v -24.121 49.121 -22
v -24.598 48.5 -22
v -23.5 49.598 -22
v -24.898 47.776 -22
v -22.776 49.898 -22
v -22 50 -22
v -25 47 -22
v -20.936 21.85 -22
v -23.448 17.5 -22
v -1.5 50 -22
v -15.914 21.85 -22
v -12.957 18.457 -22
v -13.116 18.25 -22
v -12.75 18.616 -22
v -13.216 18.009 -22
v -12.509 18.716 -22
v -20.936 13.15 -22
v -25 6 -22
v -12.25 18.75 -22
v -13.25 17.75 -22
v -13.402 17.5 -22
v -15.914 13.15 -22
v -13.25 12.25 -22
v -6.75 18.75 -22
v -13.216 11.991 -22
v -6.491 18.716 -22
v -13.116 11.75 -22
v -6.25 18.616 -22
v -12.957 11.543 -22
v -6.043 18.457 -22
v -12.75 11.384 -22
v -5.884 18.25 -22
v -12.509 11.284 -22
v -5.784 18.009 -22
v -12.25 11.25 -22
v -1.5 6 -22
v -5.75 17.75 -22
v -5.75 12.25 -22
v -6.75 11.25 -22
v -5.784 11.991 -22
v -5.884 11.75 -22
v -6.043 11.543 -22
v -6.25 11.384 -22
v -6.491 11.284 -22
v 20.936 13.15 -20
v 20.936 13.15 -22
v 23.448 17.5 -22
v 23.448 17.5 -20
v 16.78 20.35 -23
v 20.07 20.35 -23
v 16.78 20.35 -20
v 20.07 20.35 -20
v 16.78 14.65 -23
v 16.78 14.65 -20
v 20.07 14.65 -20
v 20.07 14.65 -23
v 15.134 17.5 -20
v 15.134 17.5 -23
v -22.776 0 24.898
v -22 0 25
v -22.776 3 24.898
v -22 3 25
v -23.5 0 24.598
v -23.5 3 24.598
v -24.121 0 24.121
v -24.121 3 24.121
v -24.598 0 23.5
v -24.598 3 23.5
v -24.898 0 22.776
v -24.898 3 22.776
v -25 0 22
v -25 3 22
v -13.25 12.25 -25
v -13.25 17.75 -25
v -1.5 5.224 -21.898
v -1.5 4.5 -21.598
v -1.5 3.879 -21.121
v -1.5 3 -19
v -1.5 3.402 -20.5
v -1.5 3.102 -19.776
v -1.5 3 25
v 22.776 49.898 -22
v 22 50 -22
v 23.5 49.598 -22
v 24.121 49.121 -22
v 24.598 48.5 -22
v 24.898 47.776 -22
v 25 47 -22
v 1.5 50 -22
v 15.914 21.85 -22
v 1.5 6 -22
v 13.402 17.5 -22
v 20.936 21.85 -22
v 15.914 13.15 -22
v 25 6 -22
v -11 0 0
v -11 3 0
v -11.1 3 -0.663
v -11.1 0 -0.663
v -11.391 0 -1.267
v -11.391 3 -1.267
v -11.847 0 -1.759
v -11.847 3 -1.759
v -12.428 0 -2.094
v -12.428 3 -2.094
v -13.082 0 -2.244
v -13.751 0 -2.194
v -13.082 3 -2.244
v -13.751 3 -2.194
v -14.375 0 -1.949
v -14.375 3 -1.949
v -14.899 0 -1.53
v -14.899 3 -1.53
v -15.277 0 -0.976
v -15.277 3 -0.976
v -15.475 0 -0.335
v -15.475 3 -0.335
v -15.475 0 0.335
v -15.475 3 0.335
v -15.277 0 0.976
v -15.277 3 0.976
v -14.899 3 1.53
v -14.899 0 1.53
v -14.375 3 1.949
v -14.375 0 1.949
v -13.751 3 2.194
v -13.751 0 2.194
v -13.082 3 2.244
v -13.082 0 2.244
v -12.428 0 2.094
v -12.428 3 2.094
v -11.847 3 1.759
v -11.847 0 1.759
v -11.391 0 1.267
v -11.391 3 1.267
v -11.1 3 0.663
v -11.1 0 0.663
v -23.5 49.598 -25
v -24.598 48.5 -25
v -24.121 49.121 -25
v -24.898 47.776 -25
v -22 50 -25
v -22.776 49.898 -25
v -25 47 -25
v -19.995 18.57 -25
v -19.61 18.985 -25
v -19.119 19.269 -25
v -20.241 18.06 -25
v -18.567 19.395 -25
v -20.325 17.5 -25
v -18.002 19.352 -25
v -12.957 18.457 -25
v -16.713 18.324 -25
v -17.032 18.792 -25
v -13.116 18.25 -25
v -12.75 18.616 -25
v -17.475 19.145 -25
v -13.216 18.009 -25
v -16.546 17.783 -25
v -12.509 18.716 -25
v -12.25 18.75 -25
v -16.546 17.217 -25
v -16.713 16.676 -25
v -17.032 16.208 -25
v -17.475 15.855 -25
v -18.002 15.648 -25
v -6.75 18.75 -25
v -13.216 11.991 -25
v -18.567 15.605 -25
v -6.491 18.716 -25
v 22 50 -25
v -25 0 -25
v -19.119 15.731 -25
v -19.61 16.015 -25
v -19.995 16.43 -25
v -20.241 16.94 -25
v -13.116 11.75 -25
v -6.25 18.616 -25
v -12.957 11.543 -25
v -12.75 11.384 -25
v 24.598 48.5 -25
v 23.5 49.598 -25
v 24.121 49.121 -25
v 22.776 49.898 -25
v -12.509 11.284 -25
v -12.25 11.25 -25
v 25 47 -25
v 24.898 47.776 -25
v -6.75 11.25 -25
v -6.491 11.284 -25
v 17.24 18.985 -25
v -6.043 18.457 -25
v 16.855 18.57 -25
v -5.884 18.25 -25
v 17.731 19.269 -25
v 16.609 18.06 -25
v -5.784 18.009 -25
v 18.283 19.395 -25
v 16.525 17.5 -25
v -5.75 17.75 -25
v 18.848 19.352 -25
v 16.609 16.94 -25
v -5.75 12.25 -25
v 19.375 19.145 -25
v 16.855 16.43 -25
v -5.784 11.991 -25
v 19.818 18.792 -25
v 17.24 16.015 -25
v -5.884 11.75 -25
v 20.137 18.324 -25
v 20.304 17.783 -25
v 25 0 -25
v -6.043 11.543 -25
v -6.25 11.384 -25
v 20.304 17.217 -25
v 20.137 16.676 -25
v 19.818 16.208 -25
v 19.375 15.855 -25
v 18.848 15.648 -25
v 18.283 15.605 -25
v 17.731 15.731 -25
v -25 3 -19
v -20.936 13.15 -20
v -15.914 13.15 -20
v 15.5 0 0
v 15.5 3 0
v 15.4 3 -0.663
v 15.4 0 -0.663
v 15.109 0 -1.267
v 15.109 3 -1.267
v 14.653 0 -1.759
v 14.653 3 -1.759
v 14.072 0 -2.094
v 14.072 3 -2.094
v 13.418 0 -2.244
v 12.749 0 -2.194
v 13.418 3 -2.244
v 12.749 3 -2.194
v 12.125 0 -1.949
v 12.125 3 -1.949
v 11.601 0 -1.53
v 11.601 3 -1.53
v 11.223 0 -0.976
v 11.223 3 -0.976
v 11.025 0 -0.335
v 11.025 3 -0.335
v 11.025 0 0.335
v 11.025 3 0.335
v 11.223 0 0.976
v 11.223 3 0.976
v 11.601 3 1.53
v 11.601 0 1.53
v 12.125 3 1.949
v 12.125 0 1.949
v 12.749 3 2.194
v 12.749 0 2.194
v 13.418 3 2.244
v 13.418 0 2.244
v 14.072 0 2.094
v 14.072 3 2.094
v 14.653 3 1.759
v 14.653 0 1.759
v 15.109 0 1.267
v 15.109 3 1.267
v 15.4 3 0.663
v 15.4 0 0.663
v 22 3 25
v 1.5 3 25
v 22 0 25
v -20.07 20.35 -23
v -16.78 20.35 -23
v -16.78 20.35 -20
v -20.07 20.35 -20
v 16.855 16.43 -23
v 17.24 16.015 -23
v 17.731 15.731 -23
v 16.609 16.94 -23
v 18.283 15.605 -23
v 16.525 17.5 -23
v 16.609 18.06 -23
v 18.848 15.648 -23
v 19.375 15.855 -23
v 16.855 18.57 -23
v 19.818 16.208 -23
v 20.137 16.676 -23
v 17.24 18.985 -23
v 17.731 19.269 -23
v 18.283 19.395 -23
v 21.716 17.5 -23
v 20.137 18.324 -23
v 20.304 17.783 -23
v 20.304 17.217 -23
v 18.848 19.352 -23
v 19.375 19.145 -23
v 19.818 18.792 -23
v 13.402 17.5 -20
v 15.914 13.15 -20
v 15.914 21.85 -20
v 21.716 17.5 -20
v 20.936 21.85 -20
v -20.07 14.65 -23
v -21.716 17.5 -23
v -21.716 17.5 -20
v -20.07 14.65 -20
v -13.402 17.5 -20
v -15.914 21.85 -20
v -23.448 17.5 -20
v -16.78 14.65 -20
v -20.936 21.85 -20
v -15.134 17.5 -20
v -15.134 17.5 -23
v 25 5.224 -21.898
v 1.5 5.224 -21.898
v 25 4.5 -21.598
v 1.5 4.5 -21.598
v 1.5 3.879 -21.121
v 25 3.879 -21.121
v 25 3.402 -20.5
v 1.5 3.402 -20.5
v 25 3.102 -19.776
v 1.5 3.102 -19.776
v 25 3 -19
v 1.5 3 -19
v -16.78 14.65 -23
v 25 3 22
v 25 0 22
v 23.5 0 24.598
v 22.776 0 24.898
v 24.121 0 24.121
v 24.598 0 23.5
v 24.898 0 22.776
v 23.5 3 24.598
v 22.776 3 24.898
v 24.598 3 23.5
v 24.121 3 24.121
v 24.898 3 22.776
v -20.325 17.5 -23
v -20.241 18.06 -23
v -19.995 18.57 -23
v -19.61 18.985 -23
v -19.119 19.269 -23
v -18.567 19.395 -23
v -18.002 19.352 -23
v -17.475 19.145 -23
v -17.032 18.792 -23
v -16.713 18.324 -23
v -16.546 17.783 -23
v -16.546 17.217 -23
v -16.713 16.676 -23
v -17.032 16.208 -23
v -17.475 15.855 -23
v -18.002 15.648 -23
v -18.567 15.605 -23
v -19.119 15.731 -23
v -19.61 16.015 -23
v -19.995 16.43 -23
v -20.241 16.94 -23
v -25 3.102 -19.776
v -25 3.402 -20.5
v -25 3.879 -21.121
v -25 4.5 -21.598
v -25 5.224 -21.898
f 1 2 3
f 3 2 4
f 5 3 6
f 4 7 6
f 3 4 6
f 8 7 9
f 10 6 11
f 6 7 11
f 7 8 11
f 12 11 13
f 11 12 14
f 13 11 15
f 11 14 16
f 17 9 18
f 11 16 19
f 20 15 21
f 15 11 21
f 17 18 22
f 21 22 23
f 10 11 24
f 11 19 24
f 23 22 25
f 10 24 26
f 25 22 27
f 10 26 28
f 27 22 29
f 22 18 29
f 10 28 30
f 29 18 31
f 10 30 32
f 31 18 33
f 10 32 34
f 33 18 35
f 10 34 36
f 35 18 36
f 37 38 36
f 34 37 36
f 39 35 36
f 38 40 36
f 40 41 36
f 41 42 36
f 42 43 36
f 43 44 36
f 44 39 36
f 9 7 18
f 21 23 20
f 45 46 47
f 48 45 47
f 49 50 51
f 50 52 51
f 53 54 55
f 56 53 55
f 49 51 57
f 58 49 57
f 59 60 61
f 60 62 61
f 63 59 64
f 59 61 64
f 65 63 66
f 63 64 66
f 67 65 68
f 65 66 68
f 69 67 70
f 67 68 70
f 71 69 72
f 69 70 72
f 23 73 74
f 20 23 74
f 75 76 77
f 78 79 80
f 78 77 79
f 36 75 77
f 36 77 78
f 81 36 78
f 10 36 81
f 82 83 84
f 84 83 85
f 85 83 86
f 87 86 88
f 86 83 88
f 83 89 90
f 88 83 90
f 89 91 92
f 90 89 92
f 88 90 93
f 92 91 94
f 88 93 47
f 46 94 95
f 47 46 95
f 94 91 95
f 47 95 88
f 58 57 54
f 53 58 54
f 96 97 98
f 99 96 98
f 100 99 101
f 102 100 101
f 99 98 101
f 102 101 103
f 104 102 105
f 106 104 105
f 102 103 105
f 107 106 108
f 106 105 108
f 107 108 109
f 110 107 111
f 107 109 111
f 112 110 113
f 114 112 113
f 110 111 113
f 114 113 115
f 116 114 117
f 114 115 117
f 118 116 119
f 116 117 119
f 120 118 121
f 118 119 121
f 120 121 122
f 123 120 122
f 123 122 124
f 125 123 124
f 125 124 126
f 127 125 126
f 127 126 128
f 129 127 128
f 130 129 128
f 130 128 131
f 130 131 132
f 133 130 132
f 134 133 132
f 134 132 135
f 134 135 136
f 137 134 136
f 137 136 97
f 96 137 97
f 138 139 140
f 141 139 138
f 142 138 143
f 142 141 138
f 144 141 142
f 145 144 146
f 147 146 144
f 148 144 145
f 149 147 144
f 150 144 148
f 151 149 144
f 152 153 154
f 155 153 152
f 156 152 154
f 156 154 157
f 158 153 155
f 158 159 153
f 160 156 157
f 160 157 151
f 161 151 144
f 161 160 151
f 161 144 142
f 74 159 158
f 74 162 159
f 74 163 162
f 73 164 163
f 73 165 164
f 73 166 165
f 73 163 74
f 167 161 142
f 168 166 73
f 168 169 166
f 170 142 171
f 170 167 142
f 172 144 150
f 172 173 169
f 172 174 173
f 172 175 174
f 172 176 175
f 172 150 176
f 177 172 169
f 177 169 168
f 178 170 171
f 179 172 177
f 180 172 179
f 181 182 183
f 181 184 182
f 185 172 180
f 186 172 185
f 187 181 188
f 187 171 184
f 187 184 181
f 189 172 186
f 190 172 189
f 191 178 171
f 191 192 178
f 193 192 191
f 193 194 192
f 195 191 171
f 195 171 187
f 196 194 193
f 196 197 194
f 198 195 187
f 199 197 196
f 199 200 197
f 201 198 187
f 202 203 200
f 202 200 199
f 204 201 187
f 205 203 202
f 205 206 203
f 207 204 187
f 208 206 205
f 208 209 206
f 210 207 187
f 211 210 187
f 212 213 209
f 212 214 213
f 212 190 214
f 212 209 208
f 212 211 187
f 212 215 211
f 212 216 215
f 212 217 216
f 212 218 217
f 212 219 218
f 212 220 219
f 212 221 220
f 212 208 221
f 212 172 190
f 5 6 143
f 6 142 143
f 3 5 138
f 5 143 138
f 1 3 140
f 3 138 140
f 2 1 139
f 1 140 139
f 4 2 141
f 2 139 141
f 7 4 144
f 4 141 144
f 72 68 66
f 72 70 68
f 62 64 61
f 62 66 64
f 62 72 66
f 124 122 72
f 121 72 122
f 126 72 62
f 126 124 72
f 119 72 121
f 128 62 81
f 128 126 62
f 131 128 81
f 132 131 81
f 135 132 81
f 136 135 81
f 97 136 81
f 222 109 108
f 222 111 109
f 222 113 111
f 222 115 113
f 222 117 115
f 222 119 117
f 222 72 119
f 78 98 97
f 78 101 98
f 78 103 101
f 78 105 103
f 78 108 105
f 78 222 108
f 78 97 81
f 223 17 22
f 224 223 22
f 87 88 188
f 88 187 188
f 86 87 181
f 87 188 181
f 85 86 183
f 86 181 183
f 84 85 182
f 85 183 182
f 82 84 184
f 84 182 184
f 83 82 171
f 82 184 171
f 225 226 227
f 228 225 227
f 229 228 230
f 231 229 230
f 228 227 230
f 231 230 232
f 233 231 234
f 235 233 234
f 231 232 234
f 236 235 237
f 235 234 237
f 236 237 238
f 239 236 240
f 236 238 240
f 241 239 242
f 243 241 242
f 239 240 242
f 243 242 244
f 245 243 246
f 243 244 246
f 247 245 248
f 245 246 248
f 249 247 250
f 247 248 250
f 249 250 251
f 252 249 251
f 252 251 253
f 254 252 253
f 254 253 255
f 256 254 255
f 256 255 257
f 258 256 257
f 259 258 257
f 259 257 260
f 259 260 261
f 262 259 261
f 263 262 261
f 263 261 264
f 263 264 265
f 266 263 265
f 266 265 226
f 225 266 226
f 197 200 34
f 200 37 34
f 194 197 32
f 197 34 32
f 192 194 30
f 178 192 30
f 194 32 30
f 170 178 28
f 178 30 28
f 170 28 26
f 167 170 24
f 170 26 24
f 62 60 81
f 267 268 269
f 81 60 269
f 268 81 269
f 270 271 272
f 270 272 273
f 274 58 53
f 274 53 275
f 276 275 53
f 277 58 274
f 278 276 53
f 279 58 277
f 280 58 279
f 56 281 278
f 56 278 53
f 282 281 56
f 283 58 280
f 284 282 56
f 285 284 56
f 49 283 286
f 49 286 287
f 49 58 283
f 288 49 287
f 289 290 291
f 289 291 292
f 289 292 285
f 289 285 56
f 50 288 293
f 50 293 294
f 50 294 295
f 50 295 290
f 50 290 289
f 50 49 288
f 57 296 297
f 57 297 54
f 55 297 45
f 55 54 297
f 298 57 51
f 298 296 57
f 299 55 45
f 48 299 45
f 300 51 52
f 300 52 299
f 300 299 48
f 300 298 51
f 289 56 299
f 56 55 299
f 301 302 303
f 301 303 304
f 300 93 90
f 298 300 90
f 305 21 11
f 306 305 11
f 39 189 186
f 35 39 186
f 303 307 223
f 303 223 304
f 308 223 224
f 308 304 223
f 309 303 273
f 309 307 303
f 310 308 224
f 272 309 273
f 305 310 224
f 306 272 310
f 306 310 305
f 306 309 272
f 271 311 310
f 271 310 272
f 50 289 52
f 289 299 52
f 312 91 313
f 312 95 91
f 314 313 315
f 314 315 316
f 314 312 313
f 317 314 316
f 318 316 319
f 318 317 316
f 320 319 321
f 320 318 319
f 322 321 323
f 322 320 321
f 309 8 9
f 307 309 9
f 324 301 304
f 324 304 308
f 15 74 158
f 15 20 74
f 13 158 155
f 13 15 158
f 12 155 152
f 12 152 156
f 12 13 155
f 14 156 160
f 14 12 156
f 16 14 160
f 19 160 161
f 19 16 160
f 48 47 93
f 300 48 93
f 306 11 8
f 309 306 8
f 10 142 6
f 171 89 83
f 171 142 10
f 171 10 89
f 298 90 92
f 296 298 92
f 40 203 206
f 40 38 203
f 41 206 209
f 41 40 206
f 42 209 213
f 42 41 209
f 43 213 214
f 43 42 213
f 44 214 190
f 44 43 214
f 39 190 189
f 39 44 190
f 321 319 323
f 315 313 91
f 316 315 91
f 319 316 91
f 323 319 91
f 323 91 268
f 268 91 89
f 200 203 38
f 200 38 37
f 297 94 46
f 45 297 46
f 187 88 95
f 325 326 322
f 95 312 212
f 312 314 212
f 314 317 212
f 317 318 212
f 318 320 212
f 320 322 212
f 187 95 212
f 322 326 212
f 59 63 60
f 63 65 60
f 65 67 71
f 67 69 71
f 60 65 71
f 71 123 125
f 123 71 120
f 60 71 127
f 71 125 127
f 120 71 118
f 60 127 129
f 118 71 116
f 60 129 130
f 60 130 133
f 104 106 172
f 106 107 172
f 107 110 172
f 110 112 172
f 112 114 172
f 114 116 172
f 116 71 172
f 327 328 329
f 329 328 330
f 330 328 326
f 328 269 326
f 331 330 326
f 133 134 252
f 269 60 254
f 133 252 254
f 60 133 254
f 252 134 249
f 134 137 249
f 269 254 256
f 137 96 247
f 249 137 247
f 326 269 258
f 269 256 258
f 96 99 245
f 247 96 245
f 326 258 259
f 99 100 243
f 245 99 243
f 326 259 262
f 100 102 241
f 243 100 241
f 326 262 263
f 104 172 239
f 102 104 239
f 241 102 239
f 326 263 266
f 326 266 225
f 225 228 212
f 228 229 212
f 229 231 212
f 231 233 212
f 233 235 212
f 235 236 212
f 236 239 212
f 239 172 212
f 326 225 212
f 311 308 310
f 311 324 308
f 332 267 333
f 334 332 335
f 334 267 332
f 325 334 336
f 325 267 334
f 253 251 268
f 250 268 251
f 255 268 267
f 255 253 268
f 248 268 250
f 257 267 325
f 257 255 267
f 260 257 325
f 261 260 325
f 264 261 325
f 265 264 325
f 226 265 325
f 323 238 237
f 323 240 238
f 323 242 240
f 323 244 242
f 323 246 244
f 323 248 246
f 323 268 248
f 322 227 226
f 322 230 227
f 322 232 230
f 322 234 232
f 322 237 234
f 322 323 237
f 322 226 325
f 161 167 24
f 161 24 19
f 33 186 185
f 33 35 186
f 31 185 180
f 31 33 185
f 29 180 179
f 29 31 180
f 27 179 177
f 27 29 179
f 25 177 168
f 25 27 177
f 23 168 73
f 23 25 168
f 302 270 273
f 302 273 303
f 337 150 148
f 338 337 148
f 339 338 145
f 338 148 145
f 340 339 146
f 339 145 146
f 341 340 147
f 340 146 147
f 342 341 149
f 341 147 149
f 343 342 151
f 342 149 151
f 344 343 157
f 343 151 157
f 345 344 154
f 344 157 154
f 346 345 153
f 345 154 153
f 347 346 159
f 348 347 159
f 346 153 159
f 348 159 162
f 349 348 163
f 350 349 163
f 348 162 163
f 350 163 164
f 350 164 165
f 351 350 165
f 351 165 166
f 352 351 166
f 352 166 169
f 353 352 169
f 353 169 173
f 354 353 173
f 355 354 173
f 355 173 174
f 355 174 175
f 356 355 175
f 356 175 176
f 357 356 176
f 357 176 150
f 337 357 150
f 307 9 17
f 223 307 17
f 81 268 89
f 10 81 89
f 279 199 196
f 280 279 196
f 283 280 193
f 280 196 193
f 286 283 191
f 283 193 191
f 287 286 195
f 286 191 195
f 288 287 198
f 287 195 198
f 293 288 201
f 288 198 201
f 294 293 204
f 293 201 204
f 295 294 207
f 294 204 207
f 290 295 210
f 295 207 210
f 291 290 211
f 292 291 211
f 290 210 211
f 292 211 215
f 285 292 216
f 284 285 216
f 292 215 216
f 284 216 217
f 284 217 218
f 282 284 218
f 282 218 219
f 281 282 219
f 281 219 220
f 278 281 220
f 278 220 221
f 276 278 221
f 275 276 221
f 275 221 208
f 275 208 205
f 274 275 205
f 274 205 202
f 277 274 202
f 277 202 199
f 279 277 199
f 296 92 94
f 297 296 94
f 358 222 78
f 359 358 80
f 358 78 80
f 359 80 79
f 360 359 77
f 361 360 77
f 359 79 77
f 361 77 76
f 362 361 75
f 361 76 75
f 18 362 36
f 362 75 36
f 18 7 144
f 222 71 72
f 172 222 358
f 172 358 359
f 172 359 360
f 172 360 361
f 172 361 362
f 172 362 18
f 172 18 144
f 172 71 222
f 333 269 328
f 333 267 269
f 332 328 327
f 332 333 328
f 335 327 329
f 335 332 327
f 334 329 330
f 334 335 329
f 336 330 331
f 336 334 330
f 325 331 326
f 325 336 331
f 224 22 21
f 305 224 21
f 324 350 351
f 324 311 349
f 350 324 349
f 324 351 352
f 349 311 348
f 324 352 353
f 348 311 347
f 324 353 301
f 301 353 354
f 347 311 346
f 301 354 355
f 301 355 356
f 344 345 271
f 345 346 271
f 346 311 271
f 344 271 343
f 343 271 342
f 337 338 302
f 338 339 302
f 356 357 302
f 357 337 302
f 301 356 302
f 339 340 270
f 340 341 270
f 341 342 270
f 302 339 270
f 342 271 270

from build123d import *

# Parameters (mm, degrees)
SKETCH1_W           = 50
SKETCH1_H           = 50
BOSS_EXTRUDE1_DEPTH = 3
SKETCH2_W           = 50
SKETCH2_H           = 3
BOSS_EXTRUDE2_DEPTH = 47
BOSS_EXTRUDE3_DEPTH = 1.5
CUT_EXTRUDE1_REACH  = 52
SKETCH4_R           = 1.9
SKETCH4_W           = 7.5
SKETCH4_H           = 7.5
FILLET1_R           = 1
CUT_EXTRUDE3_DEPTH  = 1
BOSS_EXTRUDE4_DEPTH = 2
FILLET3_R           = 3
CUT_EXTRUDE4_REACH  = 5
SKETCH8_R           = 2.25


with BuildPart() as part:
    # Sketch1 → Boss-Extrude1 (new body)
    with BuildSketch(Plane(origin=(0, 0, 0), x_dir=(1, 0, 0), z_dir=(0, 1, 0))):
        Rectangle(SKETCH1_W, SKETCH1_H)
    extrude(amount=BOSS_EXTRUDE1_DEPTH)

    # Sketch2 → Boss-Extrude2 (add)
    with BuildSketch(Plane(origin=(0, 3, 0), x_dir=(1, 0, 0), z_dir=(0, 1, 0))):
        with Locations((0, 23.5)):
            Rectangle(SKETCH2_W, SKETCH2_H)
    extrude(amount=BOSS_EXTRUDE2_DEPTH)

    # Sketch3 → Boss-Extrude3 (add, symmetric)
    with BuildSketch(Plane(origin=(0, 0, 0), x_dir=(0, 0, -1), z_dir=(1, 0, 0))):
        Polygon((-25, 3), (22, 50), (22, 3), align=None)
    extrude(amount=BOSS_EXTRUDE3_DEPTH, both=True)

    # Sketch4 → Cut-Extrude1 (cut, up to next)
    with BuildSketch(Plane(origin=(0, 0, -25), x_dir=(-1, 0, 0), z_dir=(0, 0, -1)), mode=Mode.PRIVATE) as cut_extrude1_sk1:
        with Locations((-18.425, 17.5)):
            Circle(SKETCH4_R)
    cut_extrude1_tool1 = extrude(cut_extrude1_sk1.sketch, amount=-CUT_EXTRUDE1_REACH, mode=Mode.PRIVATE) & part.part
    add(cut_extrude1_tool1.solids().sort_by_distance((18.425, 17.5, -25))[0], mode=Mode.SUBTRACT)
    # Sketch4 → Cut-Extrude1 (cut, up to next)
    with BuildSketch(Plane(origin=(0, 0, -25), x_dir=(-1, 0, 0), z_dir=(0, 0, -1)), mode=Mode.PRIVATE) as cut_extrude1_sk2:
        with Locations((18.425, 17.5)):
            Circle(SKETCH4_R)
    cut_extrude1_tool2 = extrude(cut_extrude1_sk2.sketch, amount=-CUT_EXTRUDE1_REACH, mode=Mode.PRIVATE) & part.part
    add(cut_extrude1_tool2.solids().sort_by_distance((-18.425, 17.5, -25))[0], mode=Mode.SUBTRACT)
    # Sketch4 → Cut-Extrude1 (cut, up to next)
    with BuildSketch(Plane(origin=(0, 0, -25), x_dir=(-1, 0, 0), z_dir=(0, 0, -1)), mode=Mode.PRIVATE) as cut_extrude1_sk3:
        with Locations((9.5, 15)):
            Rectangle(SKETCH4_W, SKETCH4_H)
    cut_extrude1_tool3 = extrude(cut_extrude1_sk3.sketch, amount=-CUT_EXTRUDE1_REACH, mode=Mode.PRIVATE) & part.part
    add(cut_extrude1_tool3.solids().sort_by_distance((-9.5, 15, -25))[0], mode=Mode.SUBTRACT)

    # Fillet1
    fillet1_edges = [part.edges().sort_by_distance(p)[0] for p in [
        (-13.25, 18.75, -23.5),
        (-13.25, 11.25, -23.5),
        (-5.75, 11.25, -23.5),
        (-5.75, 18.75, -23.5),
    ]]
    fillet(fillet1_edges, radius=FILLET1_R)

    # Sketch6 → Cut-Extrude3 (cut)
    with BuildSketch(Plane.XY.offset(-22)):
        Polygon((16.779551733, 14.65), (20.070448267, 14.65), (21.715896534, 17.5), (20.070448267, 20.35), (16.779551733, 20.35), (15.134103466, 17.5), align=None)
        Polygon((-20.070448267, 14.65), (-21.715896534, 17.5), (-20.070448267, 20.35), (-16.779551733, 20.35), (-15.134103466, 17.5), (-16.779551733, 14.65), align=None)
    extrude(amount=-CUT_EXTRUDE3_DEPTH, mode=Mode.SUBTRACT)

    # Sketch7 → Boss-Extrude4 (add)
    with BuildSketch(Plane.XY.offset(-22)):
        Polygon((-15.913526329, 13.15), (-13.402052658, 17.5), (-15.913526329, 21.85), (-20.936473671, 21.85), (-23.447947342, 17.5), (-20.936473671, 13.15), align=None)
        Polygon((-16.779551733, 14.65), (-15.134103466, 17.5), (-16.779551733, 20.35), (-20.070448267, 20.35), (-21.715896534, 17.5), (-20.070448267, 14.65), align=None, mode=Mode.SUBTRACT)
        Polygon((13.402052658, 17.5), (15.913526329, 13.15), (20.936473671, 13.15), (23.447947342, 17.5), (20.936473671, 21.85), (15.913526329, 21.85), align=None)
        Polygon((16.779551733, 14.65), (20.070448267, 14.65), (21.715896534, 17.5), (20.070448267, 20.35), (16.779551733, 20.35), (15.134103466, 17.5), align=None, mode=Mode.SUBTRACT)
    extrude(amount=BOSS_EXTRUDE4_DEPTH)

    # Fillet3
    fillet3_edges = [part.edges().sort_by_distance(p)[0] for p in [
        (-13.25, 3, -22),
        (-25, 50, -23.5),
        (25, 50, -23.5),
        (13.25, 3, -22),
        (25, 1.5, 25),
        (-25, 1.5, 25),
    ]]
    fillet(fillet3_edges, radius=FILLET3_R)

    # Sketch8 → Cut-Extrude4 (cut, up to next)
    with BuildSketch(Plane(origin=(0, 3, 0), x_dir=(1, 0, 0), z_dir=(0, 1, 0)), mode=Mode.PRIVATE) as cut_extrude4_sk1:
        with Locations((-13.25, 0)):
            Circle(SKETCH8_R)
    cut_extrude4_tool1 = extrude(cut_extrude4_sk1.sketch, amount=-CUT_EXTRUDE4_REACH, mode=Mode.PRIVATE) & part.part
    add(cut_extrude4_tool1.solids().sort_by_distance((-13.25, 3, 0))[0], mode=Mode.SUBTRACT)
    # Sketch8 → Cut-Extrude4 (cut, up to next)
    with BuildSketch(Plane(origin=(0, 3, 0), x_dir=(1, 0, 0), z_dir=(0, 1, 0)), mode=Mode.PRIVATE) as cut_extrude4_sk2:
        with Locations((13.25, 0)):
            Circle(SKETCH8_R)
    cut_extrude4_tool2 = extrude(cut_extrude4_sk2.sketch, amount=-CUT_EXTRUDE4_REACH, mode=Mode.PRIVATE) & part.part
    add(cut_extrude4_tool2.solids().sort_by_distance((13.25, 3, 0))[0], mode=Mode.SUBTRACT)


solid = part.part
